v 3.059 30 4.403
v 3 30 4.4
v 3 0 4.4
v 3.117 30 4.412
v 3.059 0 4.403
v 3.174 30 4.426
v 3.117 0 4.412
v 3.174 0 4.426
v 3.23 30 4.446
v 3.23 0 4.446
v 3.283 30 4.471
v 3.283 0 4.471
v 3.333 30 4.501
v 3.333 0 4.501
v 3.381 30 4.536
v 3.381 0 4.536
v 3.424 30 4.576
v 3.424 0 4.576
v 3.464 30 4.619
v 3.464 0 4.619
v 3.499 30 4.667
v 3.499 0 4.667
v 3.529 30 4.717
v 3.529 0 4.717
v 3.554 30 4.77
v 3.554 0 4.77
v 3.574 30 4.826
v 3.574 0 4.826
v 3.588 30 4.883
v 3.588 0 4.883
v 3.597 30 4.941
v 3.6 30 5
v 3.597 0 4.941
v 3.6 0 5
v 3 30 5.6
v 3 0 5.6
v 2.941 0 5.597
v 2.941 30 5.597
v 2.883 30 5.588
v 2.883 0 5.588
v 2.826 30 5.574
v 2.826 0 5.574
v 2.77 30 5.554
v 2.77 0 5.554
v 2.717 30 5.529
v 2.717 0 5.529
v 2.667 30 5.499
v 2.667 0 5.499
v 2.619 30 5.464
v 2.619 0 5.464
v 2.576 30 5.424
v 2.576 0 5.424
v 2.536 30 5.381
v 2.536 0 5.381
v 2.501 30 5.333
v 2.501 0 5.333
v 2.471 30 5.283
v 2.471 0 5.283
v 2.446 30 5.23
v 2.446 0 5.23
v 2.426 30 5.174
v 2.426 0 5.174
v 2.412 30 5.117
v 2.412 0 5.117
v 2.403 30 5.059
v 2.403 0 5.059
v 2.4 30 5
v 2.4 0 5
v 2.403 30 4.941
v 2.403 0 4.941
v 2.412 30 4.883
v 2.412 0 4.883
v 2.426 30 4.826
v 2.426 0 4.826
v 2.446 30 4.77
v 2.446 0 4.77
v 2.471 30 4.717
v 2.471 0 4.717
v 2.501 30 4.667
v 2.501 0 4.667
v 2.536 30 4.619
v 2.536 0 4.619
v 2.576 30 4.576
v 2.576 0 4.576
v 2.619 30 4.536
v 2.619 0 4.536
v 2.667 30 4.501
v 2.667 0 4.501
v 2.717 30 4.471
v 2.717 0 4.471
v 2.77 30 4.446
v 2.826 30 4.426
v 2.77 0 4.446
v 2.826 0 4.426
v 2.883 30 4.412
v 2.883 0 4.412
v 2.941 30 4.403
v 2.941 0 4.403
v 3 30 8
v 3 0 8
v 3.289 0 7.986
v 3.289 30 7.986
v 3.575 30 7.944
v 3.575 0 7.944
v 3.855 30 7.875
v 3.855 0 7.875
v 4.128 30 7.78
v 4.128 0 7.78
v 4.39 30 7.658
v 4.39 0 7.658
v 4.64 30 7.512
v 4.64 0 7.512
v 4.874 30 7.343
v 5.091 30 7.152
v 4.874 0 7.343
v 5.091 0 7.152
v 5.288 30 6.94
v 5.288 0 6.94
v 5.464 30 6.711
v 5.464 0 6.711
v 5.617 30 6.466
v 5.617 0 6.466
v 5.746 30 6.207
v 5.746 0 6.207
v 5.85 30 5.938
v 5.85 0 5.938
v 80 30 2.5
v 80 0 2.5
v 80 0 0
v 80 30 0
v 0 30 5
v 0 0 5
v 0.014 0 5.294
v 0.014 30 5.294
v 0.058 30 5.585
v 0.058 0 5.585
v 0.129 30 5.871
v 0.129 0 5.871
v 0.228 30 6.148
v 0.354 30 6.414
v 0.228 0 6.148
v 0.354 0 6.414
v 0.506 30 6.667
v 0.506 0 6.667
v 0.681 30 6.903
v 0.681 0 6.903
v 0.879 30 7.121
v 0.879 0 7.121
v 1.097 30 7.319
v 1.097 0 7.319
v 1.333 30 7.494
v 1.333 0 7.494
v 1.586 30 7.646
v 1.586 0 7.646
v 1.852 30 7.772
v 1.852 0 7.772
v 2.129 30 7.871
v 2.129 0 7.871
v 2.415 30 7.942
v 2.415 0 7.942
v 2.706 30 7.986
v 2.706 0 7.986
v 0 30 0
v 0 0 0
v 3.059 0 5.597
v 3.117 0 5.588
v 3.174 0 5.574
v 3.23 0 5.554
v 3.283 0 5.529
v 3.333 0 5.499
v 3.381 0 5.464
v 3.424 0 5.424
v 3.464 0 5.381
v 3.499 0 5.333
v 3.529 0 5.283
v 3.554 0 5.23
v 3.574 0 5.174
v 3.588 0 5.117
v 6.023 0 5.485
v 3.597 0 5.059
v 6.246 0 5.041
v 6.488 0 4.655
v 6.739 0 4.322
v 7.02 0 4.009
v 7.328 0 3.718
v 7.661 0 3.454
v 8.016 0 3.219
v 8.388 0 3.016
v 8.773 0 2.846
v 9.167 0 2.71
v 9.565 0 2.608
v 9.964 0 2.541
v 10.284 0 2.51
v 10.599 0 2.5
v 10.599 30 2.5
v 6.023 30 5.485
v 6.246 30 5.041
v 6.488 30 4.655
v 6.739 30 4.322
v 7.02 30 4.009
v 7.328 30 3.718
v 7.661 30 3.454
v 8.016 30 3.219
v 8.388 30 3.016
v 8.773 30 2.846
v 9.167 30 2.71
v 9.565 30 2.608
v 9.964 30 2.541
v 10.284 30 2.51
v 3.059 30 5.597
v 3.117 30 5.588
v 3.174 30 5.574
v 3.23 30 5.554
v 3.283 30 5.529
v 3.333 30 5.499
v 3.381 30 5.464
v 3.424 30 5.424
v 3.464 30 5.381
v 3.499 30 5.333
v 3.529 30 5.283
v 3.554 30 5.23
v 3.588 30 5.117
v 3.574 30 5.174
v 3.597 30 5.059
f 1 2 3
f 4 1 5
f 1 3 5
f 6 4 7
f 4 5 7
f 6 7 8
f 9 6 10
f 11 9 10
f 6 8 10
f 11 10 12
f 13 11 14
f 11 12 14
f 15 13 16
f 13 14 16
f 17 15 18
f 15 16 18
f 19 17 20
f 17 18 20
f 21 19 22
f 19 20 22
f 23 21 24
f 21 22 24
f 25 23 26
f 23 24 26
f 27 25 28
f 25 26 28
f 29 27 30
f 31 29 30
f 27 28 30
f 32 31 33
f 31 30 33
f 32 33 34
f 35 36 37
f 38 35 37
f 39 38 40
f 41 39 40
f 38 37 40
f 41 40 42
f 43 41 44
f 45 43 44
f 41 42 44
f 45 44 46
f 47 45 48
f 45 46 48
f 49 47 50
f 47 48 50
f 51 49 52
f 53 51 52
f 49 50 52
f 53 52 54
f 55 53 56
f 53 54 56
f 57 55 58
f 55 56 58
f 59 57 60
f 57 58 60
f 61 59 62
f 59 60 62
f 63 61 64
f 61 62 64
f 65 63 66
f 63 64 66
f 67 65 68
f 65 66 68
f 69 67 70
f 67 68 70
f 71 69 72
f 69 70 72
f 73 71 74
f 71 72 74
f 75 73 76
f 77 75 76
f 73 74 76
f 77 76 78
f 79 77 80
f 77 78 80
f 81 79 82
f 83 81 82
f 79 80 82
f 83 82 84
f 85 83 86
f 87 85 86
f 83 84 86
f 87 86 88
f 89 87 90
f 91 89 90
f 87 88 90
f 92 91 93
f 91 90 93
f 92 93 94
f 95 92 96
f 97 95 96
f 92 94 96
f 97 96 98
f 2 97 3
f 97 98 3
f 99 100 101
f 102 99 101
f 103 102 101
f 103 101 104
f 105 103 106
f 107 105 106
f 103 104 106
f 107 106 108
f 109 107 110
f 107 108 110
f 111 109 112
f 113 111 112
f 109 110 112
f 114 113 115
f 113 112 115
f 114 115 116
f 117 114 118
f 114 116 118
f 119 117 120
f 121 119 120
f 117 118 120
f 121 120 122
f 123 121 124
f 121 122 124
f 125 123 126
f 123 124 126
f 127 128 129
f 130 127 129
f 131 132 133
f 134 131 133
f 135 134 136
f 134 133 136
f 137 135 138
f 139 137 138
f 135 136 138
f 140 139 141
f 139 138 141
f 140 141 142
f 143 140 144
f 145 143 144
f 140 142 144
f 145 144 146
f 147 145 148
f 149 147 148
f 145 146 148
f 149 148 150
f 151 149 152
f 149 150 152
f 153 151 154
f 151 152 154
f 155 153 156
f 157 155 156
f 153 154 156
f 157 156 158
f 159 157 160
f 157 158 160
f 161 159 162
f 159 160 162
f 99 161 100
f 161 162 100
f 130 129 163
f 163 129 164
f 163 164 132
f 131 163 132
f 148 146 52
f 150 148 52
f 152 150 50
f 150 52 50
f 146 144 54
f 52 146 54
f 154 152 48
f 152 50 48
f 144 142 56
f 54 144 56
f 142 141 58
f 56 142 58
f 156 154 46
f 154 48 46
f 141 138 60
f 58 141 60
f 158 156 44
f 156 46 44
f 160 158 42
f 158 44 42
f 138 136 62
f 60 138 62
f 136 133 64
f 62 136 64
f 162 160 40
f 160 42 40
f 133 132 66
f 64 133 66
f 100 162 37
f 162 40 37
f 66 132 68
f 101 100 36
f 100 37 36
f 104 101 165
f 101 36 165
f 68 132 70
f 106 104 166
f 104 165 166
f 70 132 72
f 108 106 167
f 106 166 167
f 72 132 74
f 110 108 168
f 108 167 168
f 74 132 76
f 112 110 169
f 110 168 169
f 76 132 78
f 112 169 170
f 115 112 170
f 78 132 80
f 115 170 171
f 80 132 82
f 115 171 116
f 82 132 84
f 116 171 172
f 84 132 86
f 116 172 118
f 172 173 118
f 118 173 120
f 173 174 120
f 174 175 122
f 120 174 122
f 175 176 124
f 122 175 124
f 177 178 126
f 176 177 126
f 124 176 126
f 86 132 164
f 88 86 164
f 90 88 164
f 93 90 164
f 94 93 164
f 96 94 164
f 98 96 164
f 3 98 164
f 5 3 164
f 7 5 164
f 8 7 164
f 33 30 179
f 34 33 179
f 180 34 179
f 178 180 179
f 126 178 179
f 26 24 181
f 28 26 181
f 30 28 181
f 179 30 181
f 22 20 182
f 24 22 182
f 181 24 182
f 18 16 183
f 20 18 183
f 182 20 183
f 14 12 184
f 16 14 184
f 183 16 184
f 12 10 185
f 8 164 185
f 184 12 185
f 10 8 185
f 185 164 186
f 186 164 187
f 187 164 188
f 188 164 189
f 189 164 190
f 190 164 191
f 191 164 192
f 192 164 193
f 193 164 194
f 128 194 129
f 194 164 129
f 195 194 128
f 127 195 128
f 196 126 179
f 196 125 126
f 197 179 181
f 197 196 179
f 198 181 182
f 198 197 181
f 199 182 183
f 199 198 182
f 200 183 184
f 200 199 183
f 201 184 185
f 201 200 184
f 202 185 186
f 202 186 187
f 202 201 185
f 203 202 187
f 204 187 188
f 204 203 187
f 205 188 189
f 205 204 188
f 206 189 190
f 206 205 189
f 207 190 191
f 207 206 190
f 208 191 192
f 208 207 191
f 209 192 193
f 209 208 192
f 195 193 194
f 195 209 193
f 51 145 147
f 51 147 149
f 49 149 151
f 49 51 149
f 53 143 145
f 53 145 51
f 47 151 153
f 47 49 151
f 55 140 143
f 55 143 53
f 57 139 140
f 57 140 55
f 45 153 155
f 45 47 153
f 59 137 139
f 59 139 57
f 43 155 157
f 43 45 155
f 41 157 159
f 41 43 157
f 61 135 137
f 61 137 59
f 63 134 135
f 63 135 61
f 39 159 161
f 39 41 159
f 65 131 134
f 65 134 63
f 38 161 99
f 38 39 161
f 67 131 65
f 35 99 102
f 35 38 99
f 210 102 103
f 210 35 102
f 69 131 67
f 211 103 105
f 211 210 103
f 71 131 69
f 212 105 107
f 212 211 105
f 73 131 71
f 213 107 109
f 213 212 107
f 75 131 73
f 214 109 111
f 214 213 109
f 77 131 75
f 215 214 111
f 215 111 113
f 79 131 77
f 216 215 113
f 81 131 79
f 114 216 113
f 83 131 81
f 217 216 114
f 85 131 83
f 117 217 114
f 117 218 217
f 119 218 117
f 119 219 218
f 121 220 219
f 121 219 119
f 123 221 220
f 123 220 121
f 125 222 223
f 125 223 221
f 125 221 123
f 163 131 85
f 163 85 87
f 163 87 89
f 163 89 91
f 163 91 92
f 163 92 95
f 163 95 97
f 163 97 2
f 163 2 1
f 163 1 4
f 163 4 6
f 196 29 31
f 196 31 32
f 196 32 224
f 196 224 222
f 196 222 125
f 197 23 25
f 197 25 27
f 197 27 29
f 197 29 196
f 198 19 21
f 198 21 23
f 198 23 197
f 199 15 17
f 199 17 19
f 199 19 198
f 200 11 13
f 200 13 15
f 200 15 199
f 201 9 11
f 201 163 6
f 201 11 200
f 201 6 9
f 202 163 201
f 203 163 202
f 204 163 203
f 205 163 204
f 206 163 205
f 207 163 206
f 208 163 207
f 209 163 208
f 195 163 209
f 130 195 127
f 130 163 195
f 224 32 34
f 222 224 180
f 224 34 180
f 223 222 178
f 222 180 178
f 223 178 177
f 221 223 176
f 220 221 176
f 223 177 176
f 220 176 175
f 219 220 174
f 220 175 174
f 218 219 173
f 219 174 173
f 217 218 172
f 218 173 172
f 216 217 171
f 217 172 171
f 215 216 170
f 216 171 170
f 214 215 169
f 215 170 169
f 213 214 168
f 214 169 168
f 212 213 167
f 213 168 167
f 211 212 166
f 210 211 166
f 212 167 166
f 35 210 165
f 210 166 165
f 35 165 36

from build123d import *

# Parameters (mm, degrees)
BOSS_EXTRUDE1_DEPTH = 30
FILLET1_R           = 5


with BuildPart() as part:
    # Sketch1 → Boss-Extrude1 (new body)
    with BuildSketch(Plane(origin=(0, 0, 0), x_dir=(1, 0, 0), z_dir=(0, 1, 0))):
        with BuildLine():
            Line((80, 0), (3, 0))
            Line((3, 0), (3, -2))
            ThreePointArc((3, -2), (3.866025404, -2.127718677), (4.658312395, -2.5))
            Line((4.658312395, -2.5), (80, -2.5))
            Line((80, -2.5), (80, 0))
        make_face()
        with BuildLine():
            Line((3, -2), (3, 0))
            Line((3, 0), (0, 0))
            Line((0, 0), (0, -2.5))
            Line((0, -2.5), (1.341687605, -2.5))
            ThreePointArc((1.341687605, -2.5), (2.133974596, -2.127718677), (3, -2))
        make_face()
        with BuildLine():
            ThreePointArc((0, -5), (0.356617963, -3.581362835), (1.341687605, -2.5))
            Line((1.341687605, -2.5), (0, -2.5))
            Line((0, -2.5), (0, -5))
        make_face()
        with BuildLine():
            Line((3, -4.4), (3, -2.5))
            Line((3, -2.5), (0, -5))
            ThreePointArc((0, -5), (0.878679656, -7.121320344), (3, -8))
            Line((3, -8), (3, -5.6))
            ThreePointArc((3, -5.6), (2.4, -5), (3, -4.4))
        make_face()
        with BuildLine():
            Line((4.658312395, -2.5), (3, -2.5))
            Line((3, -2.5), (3, -4.4))
            ThreePointArc((3, -4.4), (3.424264069, -4.575735931), (3.6, -5))
            ThreePointArc((3.6, -5), (3.424264069, -5.424264069), (3, -5.6))
            Line((3, -5.6), (3, -8))
            ThreePointArc((3, -8), (5.121320344, -7.121320344), (6, -5))
            ThreePointArc((6, -5), (5.643382037, -3.581362835), (4.658312395, -2.5))
        make_face()
        with BuildLine():
            Line((0, -5), (3, -2.5))
            Line((3, -2.5), (1.341687605, -2.5))
            ThreePointArc((1.341687605, -2.5), (0.356617963, -3.581362835), (0, -5))
        make_face()
        with BuildLine():
            Line((3, -2.5), (3, -2))
            ThreePointArc((3, -2), (2.133974596, -2.127718677), (1.341687605, -2.5))
            Line((1.341687605, -2.5), (3, -2.5))
        make_face()
        with BuildLine():
            ThreePointArc((4.658312395, -2.5), (3.866025404, -2.127718677), (3, -2))
            Line((3, -2), (3, -2.5))
            Line((3, -2.5), (4.658312395, -2.5))
        make_face()
    extrude(amount=BOSS_EXTRUDE1_DEPTH)

    # Fillet1
    fillet1_edges = [part.edges().sort_by_distance(p)[0] for p in [
        (4.658312395, 15, 2.5),
    ]]
    fillet(fillet1_edges, radius=FILLET1_R)


solid = part.part
